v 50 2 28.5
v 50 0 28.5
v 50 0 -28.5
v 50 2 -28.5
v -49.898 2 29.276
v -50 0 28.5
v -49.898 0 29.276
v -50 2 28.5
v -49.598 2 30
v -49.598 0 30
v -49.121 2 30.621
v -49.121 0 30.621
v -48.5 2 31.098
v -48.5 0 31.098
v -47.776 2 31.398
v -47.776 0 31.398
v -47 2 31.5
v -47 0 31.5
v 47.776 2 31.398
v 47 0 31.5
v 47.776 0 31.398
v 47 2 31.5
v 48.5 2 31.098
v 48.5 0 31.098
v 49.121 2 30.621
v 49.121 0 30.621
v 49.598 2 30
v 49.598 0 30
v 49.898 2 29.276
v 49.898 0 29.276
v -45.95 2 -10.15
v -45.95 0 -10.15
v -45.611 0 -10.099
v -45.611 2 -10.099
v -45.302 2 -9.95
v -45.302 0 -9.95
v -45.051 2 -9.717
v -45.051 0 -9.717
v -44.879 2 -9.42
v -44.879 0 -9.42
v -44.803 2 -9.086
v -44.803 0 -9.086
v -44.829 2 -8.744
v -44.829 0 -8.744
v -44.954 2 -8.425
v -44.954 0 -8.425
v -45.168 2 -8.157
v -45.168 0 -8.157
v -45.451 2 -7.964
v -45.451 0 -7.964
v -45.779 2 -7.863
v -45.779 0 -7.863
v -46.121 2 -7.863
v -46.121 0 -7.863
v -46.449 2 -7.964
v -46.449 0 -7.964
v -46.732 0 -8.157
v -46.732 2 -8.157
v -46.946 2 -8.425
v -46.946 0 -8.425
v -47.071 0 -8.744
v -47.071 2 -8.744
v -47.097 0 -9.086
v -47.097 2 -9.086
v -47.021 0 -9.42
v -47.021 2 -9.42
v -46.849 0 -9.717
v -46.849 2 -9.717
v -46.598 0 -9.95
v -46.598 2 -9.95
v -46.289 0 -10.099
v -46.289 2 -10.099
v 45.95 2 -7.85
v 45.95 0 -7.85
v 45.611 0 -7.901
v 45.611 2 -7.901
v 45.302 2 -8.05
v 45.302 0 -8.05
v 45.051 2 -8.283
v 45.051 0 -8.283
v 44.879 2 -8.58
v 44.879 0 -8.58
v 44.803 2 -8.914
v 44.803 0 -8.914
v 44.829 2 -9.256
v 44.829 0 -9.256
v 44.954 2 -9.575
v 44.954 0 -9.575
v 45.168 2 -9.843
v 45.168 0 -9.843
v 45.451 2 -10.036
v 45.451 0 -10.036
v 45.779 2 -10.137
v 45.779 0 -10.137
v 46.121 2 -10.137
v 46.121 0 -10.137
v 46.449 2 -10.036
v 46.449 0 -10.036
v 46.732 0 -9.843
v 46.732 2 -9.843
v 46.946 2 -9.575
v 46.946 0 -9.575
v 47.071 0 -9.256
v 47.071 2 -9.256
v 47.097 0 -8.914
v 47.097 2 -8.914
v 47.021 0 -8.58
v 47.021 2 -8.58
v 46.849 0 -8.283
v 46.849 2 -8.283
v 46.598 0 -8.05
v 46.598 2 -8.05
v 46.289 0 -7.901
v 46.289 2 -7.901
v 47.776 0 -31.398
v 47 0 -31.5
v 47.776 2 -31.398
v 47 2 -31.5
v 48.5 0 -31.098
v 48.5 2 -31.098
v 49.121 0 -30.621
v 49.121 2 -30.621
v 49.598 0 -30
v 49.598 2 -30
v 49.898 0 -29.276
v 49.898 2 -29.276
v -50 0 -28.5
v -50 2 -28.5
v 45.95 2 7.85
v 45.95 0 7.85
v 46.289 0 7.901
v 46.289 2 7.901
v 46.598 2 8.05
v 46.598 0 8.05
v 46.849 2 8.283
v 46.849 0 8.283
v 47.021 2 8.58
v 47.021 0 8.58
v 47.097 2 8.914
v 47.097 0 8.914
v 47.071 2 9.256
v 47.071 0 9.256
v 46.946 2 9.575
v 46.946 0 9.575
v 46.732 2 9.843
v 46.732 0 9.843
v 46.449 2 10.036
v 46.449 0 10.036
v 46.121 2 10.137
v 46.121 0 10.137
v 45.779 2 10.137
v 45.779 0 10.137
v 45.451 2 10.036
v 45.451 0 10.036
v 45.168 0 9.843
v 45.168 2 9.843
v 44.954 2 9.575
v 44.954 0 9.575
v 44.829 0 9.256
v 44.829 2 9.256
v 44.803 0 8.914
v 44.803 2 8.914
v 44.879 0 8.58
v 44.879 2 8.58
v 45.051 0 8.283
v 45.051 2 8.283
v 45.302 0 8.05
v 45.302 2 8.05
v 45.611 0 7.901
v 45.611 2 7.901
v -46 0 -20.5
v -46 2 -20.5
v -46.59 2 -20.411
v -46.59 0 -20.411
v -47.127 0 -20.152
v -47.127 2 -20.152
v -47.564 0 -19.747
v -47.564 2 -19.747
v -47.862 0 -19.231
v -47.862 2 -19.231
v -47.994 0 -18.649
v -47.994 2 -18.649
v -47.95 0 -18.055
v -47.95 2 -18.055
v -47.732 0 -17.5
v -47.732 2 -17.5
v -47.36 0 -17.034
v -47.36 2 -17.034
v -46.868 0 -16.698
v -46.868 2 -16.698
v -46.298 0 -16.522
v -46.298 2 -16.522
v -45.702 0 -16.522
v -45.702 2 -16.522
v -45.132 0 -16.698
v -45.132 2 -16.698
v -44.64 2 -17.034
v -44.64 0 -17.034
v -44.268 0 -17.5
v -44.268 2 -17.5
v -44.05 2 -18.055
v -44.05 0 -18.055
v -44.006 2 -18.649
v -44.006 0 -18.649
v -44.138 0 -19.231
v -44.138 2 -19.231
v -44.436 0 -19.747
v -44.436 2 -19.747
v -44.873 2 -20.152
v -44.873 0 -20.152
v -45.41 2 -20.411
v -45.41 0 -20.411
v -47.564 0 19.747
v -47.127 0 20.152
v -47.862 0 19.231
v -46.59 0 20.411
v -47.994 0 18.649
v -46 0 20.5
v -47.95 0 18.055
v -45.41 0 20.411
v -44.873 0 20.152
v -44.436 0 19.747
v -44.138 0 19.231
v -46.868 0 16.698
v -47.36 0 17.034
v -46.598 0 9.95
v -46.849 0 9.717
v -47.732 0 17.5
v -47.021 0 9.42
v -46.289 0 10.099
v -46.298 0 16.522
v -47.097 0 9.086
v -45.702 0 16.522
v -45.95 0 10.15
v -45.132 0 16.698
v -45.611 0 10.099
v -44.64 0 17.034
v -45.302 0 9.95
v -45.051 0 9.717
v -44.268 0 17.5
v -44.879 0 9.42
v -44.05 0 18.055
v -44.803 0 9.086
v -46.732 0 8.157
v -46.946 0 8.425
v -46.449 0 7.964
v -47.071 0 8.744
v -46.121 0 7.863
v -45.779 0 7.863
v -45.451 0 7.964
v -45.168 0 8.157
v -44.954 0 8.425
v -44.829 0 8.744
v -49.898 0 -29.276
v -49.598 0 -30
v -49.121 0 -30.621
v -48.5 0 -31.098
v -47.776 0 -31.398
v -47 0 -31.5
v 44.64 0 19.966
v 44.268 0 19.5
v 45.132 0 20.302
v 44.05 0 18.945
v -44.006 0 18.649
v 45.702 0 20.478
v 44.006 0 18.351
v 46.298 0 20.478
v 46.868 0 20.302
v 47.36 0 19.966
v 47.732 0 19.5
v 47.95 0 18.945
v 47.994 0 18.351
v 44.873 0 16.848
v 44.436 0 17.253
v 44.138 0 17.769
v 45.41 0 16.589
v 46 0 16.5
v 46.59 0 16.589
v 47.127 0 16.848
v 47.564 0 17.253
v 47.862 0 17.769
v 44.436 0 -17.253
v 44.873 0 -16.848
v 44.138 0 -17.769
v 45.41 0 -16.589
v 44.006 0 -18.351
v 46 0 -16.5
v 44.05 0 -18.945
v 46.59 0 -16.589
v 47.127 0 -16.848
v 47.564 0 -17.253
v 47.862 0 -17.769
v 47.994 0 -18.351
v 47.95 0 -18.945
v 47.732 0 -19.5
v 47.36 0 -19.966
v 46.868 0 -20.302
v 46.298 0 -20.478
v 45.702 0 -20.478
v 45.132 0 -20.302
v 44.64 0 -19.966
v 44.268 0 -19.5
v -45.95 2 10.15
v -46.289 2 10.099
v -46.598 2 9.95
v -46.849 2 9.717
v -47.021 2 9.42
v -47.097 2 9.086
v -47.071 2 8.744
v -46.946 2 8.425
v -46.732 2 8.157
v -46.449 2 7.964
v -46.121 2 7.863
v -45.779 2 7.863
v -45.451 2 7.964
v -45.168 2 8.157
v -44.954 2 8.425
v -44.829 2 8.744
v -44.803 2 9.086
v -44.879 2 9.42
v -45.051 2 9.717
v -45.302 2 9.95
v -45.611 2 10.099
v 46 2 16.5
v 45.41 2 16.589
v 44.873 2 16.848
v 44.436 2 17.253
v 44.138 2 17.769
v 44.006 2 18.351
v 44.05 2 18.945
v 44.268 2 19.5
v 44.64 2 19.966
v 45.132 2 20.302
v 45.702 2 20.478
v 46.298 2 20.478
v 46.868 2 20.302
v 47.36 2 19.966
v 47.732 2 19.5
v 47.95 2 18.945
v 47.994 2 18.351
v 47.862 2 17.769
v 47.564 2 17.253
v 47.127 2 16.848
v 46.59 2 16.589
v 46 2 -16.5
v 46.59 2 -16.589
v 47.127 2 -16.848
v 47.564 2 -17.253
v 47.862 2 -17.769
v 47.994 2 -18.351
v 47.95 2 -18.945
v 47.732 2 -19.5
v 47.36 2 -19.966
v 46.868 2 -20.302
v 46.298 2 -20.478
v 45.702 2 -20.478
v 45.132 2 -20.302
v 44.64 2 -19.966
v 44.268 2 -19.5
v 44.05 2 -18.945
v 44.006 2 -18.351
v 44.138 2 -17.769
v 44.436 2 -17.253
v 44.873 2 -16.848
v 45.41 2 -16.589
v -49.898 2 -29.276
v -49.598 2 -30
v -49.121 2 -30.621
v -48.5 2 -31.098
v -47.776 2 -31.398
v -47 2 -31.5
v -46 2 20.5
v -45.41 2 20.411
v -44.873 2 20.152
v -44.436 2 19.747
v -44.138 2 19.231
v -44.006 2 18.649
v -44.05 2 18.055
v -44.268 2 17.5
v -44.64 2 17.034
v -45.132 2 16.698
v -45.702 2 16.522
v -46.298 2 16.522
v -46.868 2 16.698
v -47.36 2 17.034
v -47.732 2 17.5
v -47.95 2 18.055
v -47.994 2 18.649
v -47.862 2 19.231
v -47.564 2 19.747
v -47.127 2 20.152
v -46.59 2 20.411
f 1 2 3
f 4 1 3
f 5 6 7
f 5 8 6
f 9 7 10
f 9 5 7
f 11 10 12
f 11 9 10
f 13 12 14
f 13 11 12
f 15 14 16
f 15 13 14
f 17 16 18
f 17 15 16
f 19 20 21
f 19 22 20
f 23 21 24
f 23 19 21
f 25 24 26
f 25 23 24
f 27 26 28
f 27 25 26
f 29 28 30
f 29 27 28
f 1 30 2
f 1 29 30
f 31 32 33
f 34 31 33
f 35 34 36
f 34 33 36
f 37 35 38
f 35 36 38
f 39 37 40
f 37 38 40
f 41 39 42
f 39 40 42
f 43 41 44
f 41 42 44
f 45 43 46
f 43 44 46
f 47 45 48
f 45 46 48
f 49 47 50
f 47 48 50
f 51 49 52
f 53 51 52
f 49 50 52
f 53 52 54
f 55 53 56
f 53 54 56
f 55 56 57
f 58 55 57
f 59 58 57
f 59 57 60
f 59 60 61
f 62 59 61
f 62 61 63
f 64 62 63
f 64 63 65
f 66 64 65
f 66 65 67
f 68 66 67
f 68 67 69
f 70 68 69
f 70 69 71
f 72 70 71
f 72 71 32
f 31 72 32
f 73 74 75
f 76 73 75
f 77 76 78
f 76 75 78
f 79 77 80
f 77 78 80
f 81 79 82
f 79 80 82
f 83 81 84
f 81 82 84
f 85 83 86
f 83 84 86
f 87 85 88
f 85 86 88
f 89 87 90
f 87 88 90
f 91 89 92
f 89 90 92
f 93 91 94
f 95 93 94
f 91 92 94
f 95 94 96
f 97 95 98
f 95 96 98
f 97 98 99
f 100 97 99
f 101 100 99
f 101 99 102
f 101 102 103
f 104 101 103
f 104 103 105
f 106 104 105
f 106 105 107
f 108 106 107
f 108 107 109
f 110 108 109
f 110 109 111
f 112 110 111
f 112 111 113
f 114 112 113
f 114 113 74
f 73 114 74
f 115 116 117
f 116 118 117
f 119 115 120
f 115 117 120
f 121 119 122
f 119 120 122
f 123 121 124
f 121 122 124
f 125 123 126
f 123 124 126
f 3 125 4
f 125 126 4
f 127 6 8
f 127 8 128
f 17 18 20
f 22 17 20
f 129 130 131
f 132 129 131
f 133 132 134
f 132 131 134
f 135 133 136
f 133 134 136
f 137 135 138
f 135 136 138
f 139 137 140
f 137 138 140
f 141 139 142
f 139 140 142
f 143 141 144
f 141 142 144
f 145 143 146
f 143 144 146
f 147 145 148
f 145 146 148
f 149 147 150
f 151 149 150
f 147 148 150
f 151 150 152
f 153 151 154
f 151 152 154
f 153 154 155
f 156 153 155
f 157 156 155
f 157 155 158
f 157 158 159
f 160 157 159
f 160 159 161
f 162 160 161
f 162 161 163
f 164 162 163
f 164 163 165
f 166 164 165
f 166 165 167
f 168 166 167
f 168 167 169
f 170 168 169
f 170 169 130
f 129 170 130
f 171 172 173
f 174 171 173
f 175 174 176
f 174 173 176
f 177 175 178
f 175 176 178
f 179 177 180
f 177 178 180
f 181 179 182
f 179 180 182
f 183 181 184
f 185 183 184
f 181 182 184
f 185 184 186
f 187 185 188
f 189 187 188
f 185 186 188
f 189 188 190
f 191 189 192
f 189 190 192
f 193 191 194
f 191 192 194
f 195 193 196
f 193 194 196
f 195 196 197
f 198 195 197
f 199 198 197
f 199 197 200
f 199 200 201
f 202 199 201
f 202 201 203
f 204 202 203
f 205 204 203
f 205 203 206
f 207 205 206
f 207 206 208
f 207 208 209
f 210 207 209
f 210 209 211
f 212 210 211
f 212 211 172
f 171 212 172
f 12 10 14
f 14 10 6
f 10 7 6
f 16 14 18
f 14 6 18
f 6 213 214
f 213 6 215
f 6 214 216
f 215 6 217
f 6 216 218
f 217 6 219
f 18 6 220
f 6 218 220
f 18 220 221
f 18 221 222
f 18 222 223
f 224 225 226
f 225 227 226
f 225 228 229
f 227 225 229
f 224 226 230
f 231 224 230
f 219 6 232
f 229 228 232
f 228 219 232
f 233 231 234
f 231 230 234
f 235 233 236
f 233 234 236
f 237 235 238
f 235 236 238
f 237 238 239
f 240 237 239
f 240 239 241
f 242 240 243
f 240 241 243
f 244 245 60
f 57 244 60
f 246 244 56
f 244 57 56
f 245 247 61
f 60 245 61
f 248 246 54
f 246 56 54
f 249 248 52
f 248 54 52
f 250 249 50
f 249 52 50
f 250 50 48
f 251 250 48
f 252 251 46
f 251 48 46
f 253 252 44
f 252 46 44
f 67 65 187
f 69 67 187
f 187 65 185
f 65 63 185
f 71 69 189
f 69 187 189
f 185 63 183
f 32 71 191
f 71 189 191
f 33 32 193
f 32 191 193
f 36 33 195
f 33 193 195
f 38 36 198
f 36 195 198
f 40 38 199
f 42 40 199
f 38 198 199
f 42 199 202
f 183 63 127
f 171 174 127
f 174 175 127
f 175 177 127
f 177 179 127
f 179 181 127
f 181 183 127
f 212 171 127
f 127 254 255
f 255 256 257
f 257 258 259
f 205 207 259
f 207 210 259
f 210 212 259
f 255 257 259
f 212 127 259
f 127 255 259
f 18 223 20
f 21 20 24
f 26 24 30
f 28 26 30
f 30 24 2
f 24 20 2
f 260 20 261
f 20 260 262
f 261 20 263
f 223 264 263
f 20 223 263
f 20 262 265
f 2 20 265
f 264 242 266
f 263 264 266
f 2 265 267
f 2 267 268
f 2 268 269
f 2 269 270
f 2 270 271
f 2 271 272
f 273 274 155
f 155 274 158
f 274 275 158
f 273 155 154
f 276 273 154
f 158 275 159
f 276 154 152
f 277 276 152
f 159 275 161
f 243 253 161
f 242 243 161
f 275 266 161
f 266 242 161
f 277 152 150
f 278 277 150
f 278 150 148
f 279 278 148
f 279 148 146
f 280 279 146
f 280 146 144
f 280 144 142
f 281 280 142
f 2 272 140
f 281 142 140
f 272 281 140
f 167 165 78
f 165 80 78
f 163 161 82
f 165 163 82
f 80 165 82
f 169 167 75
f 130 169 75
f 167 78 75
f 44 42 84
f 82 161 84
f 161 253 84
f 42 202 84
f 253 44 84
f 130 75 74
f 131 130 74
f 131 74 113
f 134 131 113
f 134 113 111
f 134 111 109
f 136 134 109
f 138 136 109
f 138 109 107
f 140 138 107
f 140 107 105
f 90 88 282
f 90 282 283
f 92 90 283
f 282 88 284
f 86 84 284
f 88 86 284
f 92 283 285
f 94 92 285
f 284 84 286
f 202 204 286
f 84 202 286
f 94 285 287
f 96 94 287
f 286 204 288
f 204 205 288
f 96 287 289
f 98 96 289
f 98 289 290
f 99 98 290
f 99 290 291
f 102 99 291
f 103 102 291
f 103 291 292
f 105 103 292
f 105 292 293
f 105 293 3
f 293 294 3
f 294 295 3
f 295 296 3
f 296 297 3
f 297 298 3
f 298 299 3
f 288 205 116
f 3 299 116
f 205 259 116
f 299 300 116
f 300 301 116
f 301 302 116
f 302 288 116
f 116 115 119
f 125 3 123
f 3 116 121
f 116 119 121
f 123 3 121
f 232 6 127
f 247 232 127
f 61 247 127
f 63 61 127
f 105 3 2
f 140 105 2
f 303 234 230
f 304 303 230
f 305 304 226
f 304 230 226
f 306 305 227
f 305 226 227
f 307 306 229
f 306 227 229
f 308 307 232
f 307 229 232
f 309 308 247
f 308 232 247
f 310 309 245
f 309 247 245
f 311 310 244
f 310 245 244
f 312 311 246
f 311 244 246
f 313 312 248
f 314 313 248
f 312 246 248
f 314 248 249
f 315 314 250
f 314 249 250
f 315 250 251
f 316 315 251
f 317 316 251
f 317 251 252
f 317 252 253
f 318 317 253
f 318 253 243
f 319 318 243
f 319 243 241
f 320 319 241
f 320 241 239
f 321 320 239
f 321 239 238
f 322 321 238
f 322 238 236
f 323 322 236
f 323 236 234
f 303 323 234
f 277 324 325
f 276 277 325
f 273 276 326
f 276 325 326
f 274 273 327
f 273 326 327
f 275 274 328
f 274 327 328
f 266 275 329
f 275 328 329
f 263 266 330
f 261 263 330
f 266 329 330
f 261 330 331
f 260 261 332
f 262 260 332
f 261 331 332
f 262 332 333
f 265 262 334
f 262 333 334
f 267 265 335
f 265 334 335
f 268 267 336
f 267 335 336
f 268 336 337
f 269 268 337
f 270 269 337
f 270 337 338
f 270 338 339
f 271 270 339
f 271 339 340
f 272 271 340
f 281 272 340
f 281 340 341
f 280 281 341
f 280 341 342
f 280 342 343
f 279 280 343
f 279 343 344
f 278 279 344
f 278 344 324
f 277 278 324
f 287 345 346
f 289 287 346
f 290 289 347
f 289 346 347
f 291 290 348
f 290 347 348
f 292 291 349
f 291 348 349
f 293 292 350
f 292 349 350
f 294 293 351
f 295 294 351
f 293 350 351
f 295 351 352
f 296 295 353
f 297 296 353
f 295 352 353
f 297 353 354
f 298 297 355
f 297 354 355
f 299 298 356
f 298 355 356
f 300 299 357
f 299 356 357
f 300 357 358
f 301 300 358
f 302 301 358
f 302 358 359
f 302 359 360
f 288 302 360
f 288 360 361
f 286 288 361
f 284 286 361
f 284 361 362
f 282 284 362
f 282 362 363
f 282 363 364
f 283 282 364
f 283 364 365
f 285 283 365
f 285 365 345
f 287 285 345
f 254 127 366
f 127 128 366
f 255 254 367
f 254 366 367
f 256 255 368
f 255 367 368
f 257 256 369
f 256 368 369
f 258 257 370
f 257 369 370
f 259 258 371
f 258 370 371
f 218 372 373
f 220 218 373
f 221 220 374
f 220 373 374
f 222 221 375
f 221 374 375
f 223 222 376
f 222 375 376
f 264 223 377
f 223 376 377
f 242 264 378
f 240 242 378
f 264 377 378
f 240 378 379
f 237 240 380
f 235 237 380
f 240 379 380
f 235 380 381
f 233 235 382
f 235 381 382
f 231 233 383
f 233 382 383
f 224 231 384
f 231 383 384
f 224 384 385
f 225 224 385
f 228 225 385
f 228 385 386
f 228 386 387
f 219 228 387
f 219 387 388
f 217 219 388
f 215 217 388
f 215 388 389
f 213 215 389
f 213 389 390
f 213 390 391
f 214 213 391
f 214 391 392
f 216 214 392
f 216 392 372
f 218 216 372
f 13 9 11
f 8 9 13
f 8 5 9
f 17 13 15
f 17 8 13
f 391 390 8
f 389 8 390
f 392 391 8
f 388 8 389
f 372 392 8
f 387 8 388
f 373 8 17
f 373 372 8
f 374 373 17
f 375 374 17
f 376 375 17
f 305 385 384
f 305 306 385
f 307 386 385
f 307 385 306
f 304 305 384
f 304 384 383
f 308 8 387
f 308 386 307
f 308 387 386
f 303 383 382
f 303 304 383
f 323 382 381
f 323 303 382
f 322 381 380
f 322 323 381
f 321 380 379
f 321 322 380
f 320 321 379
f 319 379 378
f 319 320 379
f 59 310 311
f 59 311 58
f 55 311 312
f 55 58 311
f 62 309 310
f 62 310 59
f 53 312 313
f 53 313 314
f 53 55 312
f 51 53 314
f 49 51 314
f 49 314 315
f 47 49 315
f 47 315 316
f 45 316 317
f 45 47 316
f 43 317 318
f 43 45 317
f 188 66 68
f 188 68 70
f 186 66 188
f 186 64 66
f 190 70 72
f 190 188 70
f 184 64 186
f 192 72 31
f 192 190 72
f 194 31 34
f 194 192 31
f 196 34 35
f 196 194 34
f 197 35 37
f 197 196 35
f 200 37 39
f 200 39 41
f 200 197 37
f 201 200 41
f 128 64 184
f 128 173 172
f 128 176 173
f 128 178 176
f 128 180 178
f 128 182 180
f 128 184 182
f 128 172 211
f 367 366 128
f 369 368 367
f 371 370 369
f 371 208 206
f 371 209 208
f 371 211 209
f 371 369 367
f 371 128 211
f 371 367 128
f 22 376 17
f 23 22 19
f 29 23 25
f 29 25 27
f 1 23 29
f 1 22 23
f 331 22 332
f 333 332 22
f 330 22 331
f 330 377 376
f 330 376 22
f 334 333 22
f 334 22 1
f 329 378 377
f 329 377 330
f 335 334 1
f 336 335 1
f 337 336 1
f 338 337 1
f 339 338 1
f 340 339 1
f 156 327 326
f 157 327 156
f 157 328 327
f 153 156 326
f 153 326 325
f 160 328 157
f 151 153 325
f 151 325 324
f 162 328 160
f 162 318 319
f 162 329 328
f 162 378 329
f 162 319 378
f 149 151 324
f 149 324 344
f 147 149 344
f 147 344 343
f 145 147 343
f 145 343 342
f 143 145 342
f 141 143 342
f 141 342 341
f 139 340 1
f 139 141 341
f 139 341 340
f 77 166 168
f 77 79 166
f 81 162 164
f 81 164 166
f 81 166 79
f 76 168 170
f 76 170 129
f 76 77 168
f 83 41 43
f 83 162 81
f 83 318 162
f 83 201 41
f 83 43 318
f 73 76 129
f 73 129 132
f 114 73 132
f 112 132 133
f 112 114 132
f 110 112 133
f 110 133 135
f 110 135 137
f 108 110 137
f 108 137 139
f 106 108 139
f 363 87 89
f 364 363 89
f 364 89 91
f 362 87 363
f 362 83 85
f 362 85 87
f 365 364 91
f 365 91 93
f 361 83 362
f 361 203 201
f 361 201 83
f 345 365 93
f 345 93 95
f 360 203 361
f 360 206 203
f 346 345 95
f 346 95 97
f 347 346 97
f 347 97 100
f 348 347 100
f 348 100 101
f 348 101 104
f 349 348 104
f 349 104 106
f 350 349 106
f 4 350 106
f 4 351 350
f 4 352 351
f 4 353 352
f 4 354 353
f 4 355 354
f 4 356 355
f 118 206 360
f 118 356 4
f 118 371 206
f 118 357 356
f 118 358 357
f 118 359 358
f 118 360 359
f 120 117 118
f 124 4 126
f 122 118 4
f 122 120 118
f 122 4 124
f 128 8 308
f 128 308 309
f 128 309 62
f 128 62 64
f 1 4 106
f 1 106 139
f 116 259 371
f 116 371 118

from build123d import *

# Parameters (mm, degrees)
ESBO_O1_W                = 100
ESBO_O1_H                = 63
RESSALTO_EXTRUS_O1_DEPTH = 2
ESBO_O5_R                = 2
CORTE_EXTRUS_O3_DEPTH    = 60.129096053
FILETE1_R                = 3
ESBO_O6_R                = 1.15
CORTE_EXTRUS_O4_DEPTH    = 60.129096053


with BuildPart() as part:
    # Esboço1 → Ressalto-extrusão1 (new body)
    with BuildSketch(Plane(origin=(0, 0, 0), x_dir=(1, 0, 0), z_dir=(0, 1, 0))):
        Rectangle(ESBO_O1_W, ESBO_O1_H)
    extrude(amount=RESSALTO_EXTRUS_O1_DEPTH)

    # Esboço5 → Corte-extrusão3 (cut, through all)
    with BuildSketch(Plane(origin=(0, 2, 0), x_dir=(1, 0, 0), z_dir=(0, 1, 0))):
        with Locations(Location((46, 18.5, 0), (0, 0, 270))):
            Circle(ESBO_O5_R)
        with Locations(Location((46, -18.5, 0), (0, 0, 90))):
            Circle(ESBO_O5_R)
        with Locations(Location((-46, -18.5, 0), (0, 0, 270))):
            Circle(ESBO_O5_R)
        with Locations(Location((-46, 18.5, 0), (0, 0, 90))):
            Circle(ESBO_O5_R)
    extrude(amount=-CORTE_EXTRUS_O3_DEPTH, mode=Mode.SUBTRACT)

    # Filete1
    filete1_edges = [part.edges().sort_by_distance(p)[0] for p in [
        (-50, 1, -31.5),
        (50, 1, -31.5),
        (50, 1, 31.5),
        (-50, 1, 31.5),
    ]]
    fillet(filete1_edges, radius=FILETE1_R)

    # Esboço6 → Corte-extrusão4 (cut, through all)
    with BuildSketch(Plane.XZ):
        with Locations(Location((45.95, 9, 0), (0, 0, 270))):
            Circle(ESBO_O6_R)
        with Locations(Location((45.95, -9, 0), (0, 0, 90))):
            Circle(ESBO_O6_R)
        with Locations(Location((-45.95, -9, 0), (0, 0, 270))):
            Circle(ESBO_O6_R)
        with Locations(Location((-45.95, 9, 0), (0, 0, 90))):
            Circle(ESBO_O6_R)
    extrude(amount=-CORTE_EXTRUS_O4_DEPTH, mode=Mode.SUBTRACT)


solid = part.part
